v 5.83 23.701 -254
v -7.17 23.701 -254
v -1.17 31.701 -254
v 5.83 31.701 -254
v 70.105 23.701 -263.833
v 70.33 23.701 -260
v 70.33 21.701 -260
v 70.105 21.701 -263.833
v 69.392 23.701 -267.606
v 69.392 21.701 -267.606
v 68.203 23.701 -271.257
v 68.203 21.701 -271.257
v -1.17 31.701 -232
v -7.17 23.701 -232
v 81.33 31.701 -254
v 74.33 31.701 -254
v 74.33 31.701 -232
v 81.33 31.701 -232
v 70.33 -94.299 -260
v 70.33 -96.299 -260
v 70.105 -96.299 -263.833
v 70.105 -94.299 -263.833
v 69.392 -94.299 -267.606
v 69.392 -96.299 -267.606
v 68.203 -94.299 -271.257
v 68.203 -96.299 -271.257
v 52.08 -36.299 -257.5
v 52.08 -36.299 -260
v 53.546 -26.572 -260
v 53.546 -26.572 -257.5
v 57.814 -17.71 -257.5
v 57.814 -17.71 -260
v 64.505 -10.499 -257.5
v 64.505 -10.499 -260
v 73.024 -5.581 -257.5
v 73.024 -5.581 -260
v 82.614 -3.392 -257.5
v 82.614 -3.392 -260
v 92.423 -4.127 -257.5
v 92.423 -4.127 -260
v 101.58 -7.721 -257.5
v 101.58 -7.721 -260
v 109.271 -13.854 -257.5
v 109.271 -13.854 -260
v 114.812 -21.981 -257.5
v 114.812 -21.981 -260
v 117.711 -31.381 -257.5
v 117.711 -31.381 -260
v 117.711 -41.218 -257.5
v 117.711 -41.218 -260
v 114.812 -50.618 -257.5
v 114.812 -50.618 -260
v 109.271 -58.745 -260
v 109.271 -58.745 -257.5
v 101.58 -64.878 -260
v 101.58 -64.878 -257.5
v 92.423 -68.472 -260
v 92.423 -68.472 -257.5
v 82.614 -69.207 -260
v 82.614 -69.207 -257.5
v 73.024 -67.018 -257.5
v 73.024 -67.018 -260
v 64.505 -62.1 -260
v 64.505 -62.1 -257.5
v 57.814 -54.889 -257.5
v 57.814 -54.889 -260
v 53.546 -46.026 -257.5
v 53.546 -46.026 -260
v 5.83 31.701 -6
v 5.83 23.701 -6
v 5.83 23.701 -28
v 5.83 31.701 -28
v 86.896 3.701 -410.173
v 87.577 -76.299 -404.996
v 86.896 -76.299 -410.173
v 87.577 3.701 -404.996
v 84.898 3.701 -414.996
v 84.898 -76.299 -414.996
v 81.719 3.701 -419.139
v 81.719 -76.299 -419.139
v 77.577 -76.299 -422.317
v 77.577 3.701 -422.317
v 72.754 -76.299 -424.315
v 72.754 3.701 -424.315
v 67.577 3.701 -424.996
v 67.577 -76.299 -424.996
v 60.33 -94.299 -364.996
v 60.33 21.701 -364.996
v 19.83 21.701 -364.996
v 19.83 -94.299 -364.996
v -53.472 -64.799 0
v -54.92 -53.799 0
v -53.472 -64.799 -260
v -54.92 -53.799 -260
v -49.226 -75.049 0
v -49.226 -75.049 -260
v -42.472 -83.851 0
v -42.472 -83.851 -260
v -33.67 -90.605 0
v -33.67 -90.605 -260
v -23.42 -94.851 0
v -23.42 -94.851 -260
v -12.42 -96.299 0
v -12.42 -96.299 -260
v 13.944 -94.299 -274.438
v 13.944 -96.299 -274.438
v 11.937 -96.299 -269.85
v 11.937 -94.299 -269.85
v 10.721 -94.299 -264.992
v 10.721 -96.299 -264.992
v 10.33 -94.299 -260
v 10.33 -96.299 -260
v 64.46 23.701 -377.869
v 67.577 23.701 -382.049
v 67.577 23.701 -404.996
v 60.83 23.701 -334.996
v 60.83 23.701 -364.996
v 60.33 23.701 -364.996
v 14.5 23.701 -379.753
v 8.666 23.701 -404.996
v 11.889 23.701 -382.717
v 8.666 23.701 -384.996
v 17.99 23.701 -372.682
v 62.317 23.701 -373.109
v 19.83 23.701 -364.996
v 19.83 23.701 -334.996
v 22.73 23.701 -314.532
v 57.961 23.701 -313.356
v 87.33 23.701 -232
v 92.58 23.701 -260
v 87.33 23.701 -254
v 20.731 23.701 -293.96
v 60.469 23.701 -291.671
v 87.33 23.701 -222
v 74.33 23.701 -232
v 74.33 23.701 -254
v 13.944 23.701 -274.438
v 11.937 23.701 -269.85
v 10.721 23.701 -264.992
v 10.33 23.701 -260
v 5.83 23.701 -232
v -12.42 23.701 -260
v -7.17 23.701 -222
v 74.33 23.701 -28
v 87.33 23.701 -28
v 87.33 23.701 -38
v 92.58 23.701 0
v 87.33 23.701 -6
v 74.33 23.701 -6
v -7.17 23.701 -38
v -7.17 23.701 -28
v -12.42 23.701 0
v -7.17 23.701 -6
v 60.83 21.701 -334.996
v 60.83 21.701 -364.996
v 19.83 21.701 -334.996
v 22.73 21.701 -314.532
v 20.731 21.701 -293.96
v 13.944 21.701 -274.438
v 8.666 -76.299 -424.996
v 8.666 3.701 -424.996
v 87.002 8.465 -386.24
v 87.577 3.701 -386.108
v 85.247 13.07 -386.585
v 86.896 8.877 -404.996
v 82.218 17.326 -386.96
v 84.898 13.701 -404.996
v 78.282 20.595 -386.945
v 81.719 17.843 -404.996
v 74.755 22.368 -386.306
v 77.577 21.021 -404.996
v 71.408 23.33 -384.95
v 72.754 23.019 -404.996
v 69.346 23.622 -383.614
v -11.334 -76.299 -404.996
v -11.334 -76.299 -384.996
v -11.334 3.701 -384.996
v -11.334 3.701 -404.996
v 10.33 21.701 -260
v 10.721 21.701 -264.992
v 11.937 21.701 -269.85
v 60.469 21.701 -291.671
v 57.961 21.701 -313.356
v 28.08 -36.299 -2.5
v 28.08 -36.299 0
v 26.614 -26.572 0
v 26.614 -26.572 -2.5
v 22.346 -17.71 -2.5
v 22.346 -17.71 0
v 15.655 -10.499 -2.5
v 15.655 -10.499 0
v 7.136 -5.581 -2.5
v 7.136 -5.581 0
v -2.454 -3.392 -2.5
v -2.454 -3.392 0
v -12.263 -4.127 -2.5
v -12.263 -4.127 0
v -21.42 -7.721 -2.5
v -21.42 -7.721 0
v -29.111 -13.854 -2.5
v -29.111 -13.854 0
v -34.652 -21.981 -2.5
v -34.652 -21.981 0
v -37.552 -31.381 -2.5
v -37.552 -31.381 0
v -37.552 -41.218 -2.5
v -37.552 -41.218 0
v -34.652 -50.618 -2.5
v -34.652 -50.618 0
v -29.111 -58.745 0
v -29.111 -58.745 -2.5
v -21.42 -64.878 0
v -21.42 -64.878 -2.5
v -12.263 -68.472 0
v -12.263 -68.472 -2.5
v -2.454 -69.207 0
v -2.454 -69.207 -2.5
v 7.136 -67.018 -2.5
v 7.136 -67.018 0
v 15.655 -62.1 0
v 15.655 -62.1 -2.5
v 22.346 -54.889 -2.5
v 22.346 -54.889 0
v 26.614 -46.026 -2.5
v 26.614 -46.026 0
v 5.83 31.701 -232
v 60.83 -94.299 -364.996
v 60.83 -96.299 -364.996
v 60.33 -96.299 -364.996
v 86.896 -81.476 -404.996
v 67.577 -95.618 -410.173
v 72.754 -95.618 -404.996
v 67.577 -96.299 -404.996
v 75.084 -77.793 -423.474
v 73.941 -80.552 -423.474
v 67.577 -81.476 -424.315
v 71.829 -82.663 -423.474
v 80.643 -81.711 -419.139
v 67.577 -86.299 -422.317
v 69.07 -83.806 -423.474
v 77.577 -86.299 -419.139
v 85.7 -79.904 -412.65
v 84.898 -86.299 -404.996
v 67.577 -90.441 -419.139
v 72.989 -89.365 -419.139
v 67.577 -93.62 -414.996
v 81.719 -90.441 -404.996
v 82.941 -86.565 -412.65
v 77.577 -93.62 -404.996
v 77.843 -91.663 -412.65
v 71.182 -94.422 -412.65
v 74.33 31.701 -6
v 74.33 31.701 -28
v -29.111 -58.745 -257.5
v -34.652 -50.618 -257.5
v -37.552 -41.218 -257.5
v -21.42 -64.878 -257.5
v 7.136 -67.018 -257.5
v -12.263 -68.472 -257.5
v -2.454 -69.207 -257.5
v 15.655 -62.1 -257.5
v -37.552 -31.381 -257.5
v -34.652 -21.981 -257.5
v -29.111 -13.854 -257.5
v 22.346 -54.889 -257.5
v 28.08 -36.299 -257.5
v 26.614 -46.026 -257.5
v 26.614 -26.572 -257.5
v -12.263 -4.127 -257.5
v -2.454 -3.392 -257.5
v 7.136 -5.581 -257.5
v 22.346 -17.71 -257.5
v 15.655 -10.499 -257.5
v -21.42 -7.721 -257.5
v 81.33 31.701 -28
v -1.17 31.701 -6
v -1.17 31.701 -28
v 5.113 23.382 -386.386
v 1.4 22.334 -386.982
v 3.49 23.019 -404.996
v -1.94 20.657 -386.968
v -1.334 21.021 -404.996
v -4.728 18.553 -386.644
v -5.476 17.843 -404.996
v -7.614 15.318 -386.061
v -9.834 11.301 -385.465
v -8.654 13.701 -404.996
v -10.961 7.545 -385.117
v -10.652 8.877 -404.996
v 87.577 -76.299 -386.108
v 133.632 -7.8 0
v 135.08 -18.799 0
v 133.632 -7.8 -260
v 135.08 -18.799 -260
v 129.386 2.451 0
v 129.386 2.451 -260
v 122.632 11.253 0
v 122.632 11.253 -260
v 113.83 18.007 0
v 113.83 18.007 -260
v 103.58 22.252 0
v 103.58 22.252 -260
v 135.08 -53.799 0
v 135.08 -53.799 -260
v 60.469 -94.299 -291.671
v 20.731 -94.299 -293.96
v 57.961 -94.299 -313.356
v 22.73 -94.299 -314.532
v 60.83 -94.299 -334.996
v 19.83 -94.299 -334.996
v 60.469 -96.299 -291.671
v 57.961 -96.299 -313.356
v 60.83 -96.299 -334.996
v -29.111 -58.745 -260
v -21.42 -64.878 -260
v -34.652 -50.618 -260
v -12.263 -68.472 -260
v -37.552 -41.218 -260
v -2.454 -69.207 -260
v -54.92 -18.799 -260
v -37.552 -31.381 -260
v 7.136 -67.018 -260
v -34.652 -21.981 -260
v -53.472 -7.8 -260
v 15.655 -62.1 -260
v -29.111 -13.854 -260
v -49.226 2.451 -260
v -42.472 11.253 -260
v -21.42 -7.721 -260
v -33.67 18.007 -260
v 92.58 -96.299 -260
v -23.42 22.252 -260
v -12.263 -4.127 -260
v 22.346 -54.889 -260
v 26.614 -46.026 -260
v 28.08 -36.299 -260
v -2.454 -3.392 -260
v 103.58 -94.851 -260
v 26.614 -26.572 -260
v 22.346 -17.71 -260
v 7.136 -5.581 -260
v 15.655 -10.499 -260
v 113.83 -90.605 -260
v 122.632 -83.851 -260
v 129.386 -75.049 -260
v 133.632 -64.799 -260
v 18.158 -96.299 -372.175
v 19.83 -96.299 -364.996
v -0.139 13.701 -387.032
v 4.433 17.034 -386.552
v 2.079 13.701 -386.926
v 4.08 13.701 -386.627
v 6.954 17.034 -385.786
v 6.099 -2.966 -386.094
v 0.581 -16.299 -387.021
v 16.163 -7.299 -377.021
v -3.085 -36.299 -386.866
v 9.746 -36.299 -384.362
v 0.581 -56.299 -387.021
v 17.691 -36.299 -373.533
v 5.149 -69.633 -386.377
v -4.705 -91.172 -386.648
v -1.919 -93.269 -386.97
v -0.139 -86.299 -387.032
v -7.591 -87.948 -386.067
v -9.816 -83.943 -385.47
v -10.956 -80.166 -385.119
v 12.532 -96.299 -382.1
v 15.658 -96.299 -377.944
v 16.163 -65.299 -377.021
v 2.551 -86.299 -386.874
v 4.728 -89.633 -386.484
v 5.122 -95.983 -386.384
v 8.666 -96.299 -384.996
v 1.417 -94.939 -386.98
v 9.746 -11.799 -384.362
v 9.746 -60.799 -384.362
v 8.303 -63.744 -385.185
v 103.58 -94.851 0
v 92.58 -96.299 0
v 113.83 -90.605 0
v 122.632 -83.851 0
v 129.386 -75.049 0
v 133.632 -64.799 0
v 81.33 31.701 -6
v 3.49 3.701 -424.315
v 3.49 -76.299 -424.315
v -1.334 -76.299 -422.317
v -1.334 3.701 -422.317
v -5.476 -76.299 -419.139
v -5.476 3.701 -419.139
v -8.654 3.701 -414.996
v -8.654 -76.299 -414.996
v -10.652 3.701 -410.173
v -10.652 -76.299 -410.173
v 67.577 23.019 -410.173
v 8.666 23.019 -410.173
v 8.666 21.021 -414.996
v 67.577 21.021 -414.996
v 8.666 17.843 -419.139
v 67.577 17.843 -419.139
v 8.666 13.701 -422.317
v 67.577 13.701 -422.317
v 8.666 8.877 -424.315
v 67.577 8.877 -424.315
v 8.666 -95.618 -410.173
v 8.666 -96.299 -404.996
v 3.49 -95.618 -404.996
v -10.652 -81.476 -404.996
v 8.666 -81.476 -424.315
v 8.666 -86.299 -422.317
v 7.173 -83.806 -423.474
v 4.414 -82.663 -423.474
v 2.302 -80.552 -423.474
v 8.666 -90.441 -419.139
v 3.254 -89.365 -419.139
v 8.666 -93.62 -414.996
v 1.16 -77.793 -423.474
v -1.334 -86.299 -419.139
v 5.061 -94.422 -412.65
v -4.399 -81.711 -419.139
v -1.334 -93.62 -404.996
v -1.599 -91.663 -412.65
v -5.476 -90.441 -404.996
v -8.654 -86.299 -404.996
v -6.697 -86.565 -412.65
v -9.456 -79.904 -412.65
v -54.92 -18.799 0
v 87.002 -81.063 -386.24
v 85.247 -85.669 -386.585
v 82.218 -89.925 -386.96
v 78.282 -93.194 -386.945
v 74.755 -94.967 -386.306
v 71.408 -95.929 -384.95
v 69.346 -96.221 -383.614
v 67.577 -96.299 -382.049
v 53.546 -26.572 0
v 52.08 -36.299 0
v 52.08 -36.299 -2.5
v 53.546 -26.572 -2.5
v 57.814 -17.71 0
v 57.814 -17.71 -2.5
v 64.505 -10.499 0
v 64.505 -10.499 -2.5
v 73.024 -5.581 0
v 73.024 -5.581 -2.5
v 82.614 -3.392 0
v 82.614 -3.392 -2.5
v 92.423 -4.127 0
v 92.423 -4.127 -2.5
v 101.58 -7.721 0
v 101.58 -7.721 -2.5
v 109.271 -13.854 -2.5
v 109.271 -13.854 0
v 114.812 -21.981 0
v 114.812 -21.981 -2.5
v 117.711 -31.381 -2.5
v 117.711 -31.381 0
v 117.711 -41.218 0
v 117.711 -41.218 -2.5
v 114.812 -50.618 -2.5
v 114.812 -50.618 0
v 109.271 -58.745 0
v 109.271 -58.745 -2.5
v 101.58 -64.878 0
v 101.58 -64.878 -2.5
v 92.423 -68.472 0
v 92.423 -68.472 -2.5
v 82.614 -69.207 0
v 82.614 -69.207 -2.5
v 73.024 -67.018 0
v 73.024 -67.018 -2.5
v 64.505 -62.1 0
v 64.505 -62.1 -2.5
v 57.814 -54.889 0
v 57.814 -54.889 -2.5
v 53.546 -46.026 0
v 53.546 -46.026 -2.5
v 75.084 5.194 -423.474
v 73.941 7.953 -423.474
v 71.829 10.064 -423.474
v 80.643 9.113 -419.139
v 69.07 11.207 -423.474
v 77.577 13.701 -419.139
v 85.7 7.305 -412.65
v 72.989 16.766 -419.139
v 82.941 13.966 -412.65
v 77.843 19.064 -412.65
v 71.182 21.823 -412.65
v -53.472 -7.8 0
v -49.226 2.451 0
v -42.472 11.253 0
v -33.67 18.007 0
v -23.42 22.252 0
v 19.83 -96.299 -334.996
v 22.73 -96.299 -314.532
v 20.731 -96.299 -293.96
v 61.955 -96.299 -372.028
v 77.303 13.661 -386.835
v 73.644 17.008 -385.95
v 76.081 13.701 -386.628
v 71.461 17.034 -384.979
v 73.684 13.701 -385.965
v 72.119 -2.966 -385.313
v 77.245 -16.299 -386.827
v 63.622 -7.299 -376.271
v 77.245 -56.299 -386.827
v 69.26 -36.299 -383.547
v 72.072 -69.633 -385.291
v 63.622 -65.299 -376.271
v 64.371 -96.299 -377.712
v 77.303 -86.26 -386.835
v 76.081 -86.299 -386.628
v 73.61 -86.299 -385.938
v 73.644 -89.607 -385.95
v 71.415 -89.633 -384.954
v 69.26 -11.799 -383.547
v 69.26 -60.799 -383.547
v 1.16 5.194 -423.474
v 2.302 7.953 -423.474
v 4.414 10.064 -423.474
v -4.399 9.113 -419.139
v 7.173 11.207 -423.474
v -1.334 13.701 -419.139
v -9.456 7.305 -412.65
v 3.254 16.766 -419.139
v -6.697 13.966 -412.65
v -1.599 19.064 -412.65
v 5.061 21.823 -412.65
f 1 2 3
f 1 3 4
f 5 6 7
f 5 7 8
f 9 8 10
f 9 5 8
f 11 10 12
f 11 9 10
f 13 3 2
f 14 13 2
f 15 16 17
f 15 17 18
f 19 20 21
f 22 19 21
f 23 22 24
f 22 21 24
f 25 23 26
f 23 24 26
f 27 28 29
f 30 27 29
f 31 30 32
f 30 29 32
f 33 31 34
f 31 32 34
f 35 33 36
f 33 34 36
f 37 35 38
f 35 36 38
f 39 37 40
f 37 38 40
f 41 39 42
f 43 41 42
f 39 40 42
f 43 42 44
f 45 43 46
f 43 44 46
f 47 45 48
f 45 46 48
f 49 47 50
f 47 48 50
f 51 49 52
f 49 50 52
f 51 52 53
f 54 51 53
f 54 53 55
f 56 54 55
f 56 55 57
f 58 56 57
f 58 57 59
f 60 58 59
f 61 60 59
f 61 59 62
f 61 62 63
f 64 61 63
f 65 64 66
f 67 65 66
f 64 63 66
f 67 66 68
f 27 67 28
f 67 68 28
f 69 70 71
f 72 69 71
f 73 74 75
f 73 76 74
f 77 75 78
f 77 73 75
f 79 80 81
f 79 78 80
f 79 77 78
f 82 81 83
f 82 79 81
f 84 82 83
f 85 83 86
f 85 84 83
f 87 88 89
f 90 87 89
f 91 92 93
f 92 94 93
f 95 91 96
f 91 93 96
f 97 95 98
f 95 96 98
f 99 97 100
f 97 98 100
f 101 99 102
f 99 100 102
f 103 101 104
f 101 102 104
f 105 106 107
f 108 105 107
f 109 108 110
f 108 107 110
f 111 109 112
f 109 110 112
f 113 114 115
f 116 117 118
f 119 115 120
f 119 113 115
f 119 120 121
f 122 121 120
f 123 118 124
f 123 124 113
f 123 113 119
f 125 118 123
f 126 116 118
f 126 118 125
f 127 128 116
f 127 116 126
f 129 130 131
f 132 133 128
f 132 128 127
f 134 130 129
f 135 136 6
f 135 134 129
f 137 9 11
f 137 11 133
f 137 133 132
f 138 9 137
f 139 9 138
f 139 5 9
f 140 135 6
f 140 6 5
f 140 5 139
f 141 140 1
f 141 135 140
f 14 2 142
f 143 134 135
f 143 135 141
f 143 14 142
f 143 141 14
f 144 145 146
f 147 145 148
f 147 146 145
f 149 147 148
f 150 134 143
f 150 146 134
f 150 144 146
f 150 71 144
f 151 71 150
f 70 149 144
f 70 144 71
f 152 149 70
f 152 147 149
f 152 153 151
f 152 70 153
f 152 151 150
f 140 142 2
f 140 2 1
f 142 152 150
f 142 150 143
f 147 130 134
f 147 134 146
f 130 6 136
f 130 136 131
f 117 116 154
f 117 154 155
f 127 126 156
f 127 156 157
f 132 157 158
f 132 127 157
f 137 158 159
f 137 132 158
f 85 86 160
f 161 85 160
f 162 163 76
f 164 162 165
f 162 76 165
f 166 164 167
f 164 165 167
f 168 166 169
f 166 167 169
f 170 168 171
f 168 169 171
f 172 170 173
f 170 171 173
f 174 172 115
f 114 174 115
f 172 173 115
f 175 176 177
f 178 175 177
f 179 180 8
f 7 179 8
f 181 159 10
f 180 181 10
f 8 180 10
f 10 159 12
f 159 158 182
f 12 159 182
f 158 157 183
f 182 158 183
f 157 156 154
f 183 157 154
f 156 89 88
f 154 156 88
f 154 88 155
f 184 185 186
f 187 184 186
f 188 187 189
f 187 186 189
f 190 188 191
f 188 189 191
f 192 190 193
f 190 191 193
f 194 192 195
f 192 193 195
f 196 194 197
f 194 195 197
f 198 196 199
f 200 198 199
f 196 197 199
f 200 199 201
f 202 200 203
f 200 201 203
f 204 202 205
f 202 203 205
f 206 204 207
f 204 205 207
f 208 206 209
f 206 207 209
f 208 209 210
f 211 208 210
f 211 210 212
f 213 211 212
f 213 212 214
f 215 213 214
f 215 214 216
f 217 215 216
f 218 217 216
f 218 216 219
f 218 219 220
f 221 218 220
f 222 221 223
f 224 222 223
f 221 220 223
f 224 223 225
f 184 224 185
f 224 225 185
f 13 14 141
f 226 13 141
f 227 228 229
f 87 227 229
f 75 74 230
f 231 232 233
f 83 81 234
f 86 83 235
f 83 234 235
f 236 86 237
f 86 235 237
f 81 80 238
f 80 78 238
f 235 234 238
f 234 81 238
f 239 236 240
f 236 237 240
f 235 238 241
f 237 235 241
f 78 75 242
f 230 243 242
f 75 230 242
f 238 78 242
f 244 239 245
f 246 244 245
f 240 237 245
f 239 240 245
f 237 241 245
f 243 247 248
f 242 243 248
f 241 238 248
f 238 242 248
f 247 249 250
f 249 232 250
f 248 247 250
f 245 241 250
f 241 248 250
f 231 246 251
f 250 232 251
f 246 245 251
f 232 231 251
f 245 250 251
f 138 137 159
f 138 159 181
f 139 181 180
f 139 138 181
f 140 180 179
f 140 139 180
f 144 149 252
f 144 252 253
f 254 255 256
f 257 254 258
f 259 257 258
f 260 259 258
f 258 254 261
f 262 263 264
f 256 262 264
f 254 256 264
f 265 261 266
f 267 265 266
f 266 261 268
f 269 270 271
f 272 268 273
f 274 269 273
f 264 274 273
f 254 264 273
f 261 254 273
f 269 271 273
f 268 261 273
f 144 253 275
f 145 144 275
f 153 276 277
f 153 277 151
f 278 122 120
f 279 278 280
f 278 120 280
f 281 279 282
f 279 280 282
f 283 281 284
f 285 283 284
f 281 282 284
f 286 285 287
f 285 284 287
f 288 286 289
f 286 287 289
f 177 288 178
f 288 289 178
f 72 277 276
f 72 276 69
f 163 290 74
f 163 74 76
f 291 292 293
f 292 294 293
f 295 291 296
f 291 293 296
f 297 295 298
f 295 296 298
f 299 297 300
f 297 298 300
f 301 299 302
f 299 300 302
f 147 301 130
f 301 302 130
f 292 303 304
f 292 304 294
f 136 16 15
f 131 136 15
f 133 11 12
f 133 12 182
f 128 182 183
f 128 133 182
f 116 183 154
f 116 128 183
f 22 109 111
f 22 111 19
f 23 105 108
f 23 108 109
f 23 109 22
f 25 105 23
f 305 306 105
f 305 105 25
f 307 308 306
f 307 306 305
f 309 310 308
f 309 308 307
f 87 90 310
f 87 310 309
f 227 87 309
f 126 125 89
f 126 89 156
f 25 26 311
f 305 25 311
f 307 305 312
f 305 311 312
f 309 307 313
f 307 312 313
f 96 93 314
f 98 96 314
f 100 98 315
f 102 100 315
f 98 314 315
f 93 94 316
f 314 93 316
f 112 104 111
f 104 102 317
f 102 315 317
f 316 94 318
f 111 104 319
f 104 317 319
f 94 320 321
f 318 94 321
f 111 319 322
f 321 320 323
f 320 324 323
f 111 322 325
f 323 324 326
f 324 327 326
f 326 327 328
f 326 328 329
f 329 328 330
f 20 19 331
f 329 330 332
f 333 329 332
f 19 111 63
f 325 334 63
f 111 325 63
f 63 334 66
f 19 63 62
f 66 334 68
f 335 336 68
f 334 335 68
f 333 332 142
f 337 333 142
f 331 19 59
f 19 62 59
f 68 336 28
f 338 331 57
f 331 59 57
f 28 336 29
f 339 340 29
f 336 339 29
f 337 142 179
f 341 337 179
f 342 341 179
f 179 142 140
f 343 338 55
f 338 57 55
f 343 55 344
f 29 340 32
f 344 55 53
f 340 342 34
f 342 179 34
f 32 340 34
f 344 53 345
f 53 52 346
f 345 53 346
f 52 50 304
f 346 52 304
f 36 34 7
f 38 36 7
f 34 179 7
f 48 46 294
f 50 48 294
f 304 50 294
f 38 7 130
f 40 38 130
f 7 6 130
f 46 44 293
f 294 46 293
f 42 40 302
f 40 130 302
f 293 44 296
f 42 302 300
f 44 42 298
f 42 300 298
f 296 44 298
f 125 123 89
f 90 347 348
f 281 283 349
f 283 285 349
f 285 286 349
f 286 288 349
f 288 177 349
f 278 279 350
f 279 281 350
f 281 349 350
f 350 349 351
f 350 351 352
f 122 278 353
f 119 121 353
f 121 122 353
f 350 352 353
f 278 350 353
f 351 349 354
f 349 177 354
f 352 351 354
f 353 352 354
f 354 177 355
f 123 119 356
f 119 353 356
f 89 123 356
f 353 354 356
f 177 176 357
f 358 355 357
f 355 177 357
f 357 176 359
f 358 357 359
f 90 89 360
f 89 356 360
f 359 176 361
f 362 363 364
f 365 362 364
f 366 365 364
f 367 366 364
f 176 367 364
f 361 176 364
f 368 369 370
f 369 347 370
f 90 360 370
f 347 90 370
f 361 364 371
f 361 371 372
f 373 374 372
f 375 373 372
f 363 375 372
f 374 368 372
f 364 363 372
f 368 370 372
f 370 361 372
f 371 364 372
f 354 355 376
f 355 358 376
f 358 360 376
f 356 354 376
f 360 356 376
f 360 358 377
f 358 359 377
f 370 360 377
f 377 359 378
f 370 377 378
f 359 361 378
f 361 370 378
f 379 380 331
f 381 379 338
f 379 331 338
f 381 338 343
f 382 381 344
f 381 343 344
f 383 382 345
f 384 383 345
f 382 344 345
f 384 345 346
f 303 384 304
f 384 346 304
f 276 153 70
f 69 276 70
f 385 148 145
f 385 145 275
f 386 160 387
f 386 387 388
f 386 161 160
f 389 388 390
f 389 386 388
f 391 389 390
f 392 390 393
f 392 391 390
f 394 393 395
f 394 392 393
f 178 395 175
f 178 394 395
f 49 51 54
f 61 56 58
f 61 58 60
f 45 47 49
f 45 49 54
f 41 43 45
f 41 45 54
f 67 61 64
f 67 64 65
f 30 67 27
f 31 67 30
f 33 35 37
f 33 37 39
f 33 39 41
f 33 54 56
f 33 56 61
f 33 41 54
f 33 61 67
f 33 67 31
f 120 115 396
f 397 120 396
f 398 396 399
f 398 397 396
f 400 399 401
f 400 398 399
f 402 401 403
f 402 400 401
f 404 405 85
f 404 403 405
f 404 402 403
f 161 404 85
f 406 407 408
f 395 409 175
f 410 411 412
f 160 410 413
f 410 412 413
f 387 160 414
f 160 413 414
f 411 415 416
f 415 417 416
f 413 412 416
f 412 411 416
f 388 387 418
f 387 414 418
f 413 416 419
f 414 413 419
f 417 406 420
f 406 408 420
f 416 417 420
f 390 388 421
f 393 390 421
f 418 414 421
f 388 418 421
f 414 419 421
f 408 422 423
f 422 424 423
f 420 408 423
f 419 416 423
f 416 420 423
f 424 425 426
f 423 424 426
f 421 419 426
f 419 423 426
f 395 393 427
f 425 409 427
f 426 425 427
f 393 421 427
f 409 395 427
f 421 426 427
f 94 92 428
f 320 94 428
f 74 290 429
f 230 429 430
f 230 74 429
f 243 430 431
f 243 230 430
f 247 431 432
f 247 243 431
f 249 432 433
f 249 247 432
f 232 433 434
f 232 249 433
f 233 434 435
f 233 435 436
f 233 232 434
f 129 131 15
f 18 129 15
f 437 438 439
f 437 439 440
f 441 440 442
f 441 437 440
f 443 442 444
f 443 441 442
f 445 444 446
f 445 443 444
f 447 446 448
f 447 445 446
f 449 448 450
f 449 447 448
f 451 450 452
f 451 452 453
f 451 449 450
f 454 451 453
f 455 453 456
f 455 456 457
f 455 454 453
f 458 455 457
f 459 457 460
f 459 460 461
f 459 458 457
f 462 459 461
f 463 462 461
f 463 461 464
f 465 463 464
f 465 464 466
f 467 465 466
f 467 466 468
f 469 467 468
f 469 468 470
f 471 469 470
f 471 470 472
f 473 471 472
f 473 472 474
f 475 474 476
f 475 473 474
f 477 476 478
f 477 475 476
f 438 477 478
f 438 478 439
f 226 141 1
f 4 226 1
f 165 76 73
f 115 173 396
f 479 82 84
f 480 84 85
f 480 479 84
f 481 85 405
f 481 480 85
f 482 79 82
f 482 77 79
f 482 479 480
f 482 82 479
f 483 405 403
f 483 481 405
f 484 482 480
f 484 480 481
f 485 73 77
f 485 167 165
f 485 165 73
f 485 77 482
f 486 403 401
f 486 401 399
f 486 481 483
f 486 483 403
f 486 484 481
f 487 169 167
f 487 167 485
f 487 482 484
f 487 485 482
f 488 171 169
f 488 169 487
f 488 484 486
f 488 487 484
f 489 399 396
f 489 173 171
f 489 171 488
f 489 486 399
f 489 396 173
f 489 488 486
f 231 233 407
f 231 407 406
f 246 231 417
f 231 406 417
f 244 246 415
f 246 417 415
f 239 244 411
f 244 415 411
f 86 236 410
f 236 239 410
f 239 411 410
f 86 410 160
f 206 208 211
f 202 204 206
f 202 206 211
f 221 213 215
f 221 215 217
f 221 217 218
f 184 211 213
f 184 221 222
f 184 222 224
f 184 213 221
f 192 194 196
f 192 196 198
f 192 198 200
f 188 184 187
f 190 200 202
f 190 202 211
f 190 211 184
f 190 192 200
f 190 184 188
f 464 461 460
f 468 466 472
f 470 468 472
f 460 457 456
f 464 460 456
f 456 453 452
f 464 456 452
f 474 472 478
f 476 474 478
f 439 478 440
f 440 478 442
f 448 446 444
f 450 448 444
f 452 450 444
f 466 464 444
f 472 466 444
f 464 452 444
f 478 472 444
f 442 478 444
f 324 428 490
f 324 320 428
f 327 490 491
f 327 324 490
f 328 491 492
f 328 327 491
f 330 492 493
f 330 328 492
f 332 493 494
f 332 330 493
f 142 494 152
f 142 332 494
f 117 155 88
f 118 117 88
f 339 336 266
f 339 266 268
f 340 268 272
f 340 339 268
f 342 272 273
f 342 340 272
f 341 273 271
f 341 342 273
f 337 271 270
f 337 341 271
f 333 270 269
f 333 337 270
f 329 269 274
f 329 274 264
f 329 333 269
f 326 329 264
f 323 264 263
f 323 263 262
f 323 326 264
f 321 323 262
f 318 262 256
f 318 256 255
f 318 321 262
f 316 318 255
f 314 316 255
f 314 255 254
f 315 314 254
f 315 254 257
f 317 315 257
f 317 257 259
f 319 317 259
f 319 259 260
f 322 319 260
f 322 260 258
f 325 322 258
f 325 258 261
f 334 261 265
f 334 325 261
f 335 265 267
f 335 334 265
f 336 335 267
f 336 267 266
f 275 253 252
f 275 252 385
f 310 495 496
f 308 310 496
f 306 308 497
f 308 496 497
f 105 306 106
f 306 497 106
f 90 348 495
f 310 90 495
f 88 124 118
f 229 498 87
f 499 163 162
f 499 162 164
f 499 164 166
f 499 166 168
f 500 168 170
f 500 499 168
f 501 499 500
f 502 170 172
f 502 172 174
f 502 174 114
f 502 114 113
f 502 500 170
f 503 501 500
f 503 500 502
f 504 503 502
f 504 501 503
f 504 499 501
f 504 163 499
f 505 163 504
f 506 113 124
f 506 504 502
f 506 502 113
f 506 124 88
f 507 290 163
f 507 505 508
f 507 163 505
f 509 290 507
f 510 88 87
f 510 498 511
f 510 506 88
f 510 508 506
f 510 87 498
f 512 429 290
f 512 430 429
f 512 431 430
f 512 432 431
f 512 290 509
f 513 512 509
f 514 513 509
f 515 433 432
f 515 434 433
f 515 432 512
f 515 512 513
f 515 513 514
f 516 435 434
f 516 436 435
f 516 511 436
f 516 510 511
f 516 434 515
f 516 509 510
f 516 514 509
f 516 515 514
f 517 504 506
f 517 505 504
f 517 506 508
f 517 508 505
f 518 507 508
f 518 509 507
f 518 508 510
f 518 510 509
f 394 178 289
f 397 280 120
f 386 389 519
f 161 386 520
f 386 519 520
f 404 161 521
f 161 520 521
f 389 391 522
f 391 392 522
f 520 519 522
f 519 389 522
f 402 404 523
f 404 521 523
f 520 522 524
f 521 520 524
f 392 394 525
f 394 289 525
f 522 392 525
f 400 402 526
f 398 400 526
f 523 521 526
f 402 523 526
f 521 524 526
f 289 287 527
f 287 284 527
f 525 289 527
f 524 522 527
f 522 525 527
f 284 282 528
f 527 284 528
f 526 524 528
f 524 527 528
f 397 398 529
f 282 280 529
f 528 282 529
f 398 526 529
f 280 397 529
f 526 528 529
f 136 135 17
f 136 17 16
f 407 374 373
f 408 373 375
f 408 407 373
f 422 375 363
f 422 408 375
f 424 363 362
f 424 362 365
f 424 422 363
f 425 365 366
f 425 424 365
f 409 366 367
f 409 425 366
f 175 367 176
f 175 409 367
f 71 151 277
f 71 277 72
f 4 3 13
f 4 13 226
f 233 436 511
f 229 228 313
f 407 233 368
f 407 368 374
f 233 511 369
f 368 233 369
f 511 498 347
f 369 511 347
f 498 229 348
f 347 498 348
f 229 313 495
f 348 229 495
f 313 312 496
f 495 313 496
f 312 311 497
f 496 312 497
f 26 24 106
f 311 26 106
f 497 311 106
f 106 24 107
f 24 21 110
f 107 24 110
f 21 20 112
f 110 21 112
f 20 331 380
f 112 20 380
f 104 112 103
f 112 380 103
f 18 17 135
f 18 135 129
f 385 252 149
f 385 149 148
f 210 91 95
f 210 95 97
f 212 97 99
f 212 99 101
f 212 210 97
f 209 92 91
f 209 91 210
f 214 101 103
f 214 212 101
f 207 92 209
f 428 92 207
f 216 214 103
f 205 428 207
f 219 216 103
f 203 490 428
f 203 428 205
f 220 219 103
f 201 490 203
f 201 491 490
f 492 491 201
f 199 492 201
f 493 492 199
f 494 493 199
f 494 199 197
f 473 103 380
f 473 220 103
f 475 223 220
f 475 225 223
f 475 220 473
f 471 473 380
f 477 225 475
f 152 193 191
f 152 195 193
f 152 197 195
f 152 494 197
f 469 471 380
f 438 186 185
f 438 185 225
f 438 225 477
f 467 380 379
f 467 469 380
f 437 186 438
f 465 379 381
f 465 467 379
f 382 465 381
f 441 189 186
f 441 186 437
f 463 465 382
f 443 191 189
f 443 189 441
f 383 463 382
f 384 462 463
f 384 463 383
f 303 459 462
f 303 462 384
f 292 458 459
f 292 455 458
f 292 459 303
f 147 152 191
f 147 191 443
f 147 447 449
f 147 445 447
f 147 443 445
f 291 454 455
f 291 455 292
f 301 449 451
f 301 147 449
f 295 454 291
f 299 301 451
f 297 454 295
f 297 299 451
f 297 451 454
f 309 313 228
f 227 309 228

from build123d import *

# Parameters (mm, degrees)
SKETCH1_W               = 190
SKETCH1_H               = 120
BOSS_EXTRUDE1_DEPTH     = 260
FILLET1_R               = 42.5
SKETCH2_W               = 13
SKETCH2_H               = 22
BOSS_EXTRUDE2_DEPTH     = 8
CUT_EXTRUDE5_DEPTH      = 32
CUT_EXTRUDE6_DEPTH      = 32
BOSS_EXTRUDE3_DEPTH     = 2
SKETCH10_R              = 33
CUT_EXTRUDE7_DEPTH      = 2.5
MIRROR3_COPY_1_SKETCH_R = 33
MIRROR3_COPY_1_DEPTH    = 2.5
SKETCH11_W              = 98.911006982
SKETCH11_H              = 120
BOSS_EXTRUDE4_DEPTH     = 60
FILLET2_R               = 20
CUT_EXTRUDE8_REACH      = 465.953


with BuildPart() as part:
    # Sketch1 → Boss-Extrude1 (new body)
    with BuildSketch(Plane.XY):
        with Locations((40.07989685, -36.299360248)):
            Rectangle(SKETCH1_W, SKETCH1_H)
    extrude(amount=-BOSS_EXTRUDE1_DEPTH)

    # Fillet1
    fillet1_edges = [part.edges().sort_by_distance(p)[0] for p in [
        (-54.92010315, 23.700639752, -130),
        (135.07989685, 23.700639752, -130),
        (135.07989685, -96.299360248, -130),
        (-54.92010315, -96.299360248, -130),
    ]]
    fillet(fillet1_edges, radius=FILLET1_R)

    # Sketch2 → Boss-Extrude2 (add)
    with BuildSketch(Plane(origin=(0, 23.700639752, 0), x_dir=(1, 0, 0), z_dir=(0, 1, 0))):
        with Locations((-0.67010315, 243)):
            Rectangle(SKETCH2_W, SKETCH2_H)
        with Locations((80.82989685, 243)):
            Rectangle(SKETCH2_W, SKETCH2_H)
        with Locations((-0.67010315, 17)):
            Rectangle(SKETCH2_W, SKETCH2_H)
        with Locations((80.82989685, 17)):
            Rectangle(SKETCH2_W, SKETCH2_H)
    extrude(amount=BOSS_EXTRUDE2_DEPTH)

    # Sketch5 → Cut-Extrude5 (cut)
    with BuildSketch(Plane(origin=(0, 0, -254), x_dir=(-1, 0, 0), z_dir=(0, 0, -1))):
        Polygon((-87.32989685, 23.700639752), (-81.32989685, 31.700639752), (-87.32989685, 31.700639752), align=None)
    cut_extrude5 = extrude(amount=-CUT_EXTRUDE5_DEPTH, mode=Mode.SUBTRACT)

    # Sketch7 → Cut-Extrude6 (cut)
    with BuildSketch(Plane(origin=(0, 0, -254), x_dir=(-1, 0, 0), z_dir=(0, 0, -1))):
        Polygon((1.17010315, 31.700639752), (7.17010315, 23.700639752), (7.17010315, 31.700639752), align=None)
    cut_extrude6 = extrude(amount=-CUT_EXTRUDE6_DEPTH, mode=Mode.SUBTRACT)

    # Mirror1: Cut-Extrude5, Cut-Extrude6 across plane
    add(cut_extrude5.mirror(Plane.XY.offset(-130)), mode=Mode.SUBTRACT)
    add(cut_extrude6.mirror(Plane.XY.offset(-130)), mode=Mode.SUBTRACT)

    # Sketch9 → Boss-Extrude3 (add)
    with BuildSketch(Plane(origin=(0, 23.700639752, 0), x_dir=(1, 0, 0), z_dir=(0, 1, 0))):
        with BuildLine():
            ThreePointArc((13.944025684, 274.437502336), (11.227457344, 267.446426584), (10.32989685, 260))
            Line((10.32989685, 260), (10.32989685, 225))
            Line((10.32989685, 225), (20.57989685, 225))
            Line((20.57989685, 225), (61.829871341, 225))
            Line((61.829871341, 225), (70.32989685, 225))
            Line((70.32989685, 225), (70.32989685, 260))
            ThreePointArc((70.32989685, 260), (69.808755544, 265.731054618), (68.202935744, 271.257167))
            ThreePointArc((68.202935744, 271.257167), (58.544976128, 302.436051532), (60.82989685, 334.996428708))
            Line((60.82989685, 334.996428708), (60.82989685, 364.996428708))
            Line((60.82989685, 364.996428708), (19.82989685, 364.996428708))
            Line((19.82989685, 364.996428708), (19.82989685, 334.996428708))
            ThreePointArc((19.82989685, 334.996428708), (22.342438119, 304.186734294), (13.944025684, 274.437502336))
        make_face()
    boss_extrude3 = extrude(amount=-BOSS_EXTRUDE3_DEPTH)

    # Sketch10 → Cut-Extrude7 (cut, symmetric)
    with BuildSketch(Plane(origin=(0, 0, -260), x_dir=(-1, 0, 0), z_dir=(0, 0, -1))):
        with Locations((-85.07989685, -36.299360248)):
            Circle(SKETCH10_R)
    cut_extrude7 = extrude(amount=CUT_EXTRUDE7_DEPTH, both=True, mode=Mode.SUBTRACT)

    # Mirror2: Cut-Extrude7 across plane
    add(cut_extrude7.mirror(Plane(origin=(40.07989685, 0, 0), x_dir=(0, 0, 1), z_dir=(1, 0, 0))), mode=Mode.SUBTRACT)

    # Mirror3: Cut-Extrude7 across plane
    add(cut_extrude7.mirror(Plane.XY.offset(-130)), mode=Mode.SUBTRACT)

    # Mirror3 copy 1 sketch → Mirror3 copy 1 (cut, symmetric)
    with BuildSketch(Plane(origin=(80.1597937, 0, 0), x_dir=(1, 0, 0), z_dir=(0, 0, 1))):
        with Locations((-85.07989685, -36.299360248)):
            Circle(MIRROR3_COPY_1_SKETCH_R)
    extrude(amount=MIRROR3_COPY_1_DEPTH, both=True, mode=Mode.SUBTRACT)

    # Mirror4: Boss-Extrude3 across plane
    add(boss_extrude3.mirror(Plane.ZX.offset(-36.299360248)))

    # Sketch11 → Boss-Extrude4 (add)
    with BuildSketch(Plane(origin=(0, 0, -364.996428708), x_dir=(-1, 0, 0), z_dir=(0, 0, -1))):
        with Locations((-38.121760163, -36.299360248)):
            Rectangle(SKETCH11_W, SKETCH11_H)
    extrude(amount=BOSS_EXTRUDE4_DEPTH)

    # Fillet2
    fillet2_edges = [part.edges().sort_by_distance(p)[0] for p in [
        (87.577263654, 23.700639752, -394.996428708),
        (87.577263654, -96.299360248, -394.996428708),
        (-11.333743328, -96.299360248, -394.996428708),
        (-11.333743328, 23.700639752, -394.996428708),
        (87.577263654, -36.299360248, -424.996428708),
        (38.121760163, -96.299360248, -424.996428708),
        (-11.333743328, -36.299360248, -424.996428708),
        (38.121760163, 23.700639752, -424.996428708),
    ]]
    fillet(fillet2_edges, radius=FILLET2_R)

    # Sketch12 → Cut-Extrude8 (cut, up to next)
    with BuildSketch(Plane.XZ.offset(96.299360248), mode=Mode.PRIVATE) as cut_extrude8_sk1:
        with BuildLine():
            Line((-11.333743328, -384.996428708), (-11.333743328, -364.996428708))
            Line((-11.333743328, -364.996428708), (19.82989685, -364.996428708))
            add(Edge.make_bspline(
                [(-11.333743328, -384.996428708), (15.244679544, -393.728247891), (19.82989685, -364.996428708)],
                knots=[0, 0, 0, 1, 1, 1], degree=2))
        make_face()
    cut_extrude8_tool1 = extrude(cut_extrude8_sk1.sketch, amount=-CUT_EXTRUDE8_REACH, mode=Mode.PRIVATE) & part.part
    cut_extrude8 = cut_extrude8_tool1.solids().sort_by_distance((2.471753, -96.29936, -374.935763))[0]
    add(cut_extrude8, mode=Mode.SUBTRACT)

    # Mirror5: Cut-Extrude8 across plane
    add(cut_extrude8.mirror(Plane(origin=(40.07989685, 0, 0), x_dir=(0, 0, 1), z_dir=(1, 0, 0))), mode=Mode.SUBTRACT)


solid = part.part
